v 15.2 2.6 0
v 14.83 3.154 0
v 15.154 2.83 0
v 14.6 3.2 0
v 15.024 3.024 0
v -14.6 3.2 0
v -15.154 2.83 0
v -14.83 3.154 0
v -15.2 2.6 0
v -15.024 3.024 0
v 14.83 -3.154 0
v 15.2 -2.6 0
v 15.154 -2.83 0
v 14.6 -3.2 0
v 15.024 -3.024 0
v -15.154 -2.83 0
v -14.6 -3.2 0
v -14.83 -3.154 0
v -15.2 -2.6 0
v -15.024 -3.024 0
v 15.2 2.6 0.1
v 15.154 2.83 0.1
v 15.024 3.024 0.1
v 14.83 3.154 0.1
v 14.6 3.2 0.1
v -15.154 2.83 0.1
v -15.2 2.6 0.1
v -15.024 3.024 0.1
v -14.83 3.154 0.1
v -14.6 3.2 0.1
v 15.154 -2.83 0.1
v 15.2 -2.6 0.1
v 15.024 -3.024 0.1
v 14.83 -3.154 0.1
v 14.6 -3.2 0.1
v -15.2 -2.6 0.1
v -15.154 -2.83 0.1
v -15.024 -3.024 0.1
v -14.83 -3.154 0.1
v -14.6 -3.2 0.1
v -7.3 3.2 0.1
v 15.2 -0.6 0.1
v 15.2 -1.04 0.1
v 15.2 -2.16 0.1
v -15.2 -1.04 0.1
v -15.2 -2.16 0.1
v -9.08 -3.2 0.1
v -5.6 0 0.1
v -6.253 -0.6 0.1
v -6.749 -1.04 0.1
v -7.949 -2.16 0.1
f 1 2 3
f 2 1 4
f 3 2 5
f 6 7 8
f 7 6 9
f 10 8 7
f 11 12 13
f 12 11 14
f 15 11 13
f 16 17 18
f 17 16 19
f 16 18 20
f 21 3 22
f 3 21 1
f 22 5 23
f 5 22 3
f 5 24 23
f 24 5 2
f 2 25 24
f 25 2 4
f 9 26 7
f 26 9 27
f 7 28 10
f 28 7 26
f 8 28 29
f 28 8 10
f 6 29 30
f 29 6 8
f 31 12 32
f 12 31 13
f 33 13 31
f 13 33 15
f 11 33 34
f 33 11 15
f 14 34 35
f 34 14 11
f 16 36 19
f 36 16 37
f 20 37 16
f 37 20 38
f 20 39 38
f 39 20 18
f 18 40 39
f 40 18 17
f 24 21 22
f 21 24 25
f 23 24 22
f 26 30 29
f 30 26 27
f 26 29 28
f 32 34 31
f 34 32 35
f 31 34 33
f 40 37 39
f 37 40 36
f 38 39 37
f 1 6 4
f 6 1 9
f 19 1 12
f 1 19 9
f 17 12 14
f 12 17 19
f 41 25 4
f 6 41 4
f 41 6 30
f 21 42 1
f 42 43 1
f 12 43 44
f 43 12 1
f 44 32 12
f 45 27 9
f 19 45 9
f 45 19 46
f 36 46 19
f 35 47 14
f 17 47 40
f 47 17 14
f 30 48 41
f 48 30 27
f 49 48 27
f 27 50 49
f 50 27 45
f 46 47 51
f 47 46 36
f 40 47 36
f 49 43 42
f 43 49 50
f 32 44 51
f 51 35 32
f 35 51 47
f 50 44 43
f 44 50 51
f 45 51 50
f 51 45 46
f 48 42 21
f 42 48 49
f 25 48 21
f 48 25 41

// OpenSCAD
// file: ../p/1-4cyli.scad
use <../lib.scad>
function ldraw_lib__1_4cyli() = [
// 0 Cylinder 0.25
// 0 Name: 1-4cyli.dat
// 0 Author: James Jessiman
// 0 !LDRAW_ORG Primitive UPDATE 2012-01
// 0 !LICENSE Licensed under CC BY 4.0 : see CAreadme.txt
// 
// 0 BFC CERTIFY CCW
  [0,"BFC","CERTIFY"],
  [0,"BFC","CCW"],
// 
// 0 !HISTORY 2002-03-23 [sbliss] Added BFC statement.
// 0 !HISTORY 2002-04-25 [PTadmin] Official Update 2002-02
// 0 !HISTORY 2007-06-22 [PTadmin] Header formatted for Contributor Agreement
// 0 !HISTORY 2008-07-01 [PTadmin] Official Update 2008-01
// 0 !HISTORY 2012-02-16 [Philo] Changed to CCW
// 0 !HISTORY 2012-03-30 [PTadmin] Official Update 2012-01
// 
// 
// 4 16 1 1 0 0.9239 1 0.3827 0.9239 0 0.3827 1 0 0
  [4,16,1,1,0,0.9239,1,0.3827,0.9239,0,0.3827,1,0,0],
// 5 24 1 0 0 1 1 0 0.9239 0 0.3827 1 0 -1
  [5,24,1,0,0,1,1,0,0.9239,0,0.3827,1,0,-1],
// 4 16 0.9239 1 0.3827 0.7071 1 0.7071 0.7071 0 0.7071 0.9239 0 0.3827
  [4,16,0.9239,1,0.3827,0.7071,1,0.7071,0.7071,0,0.7071,0.9239,0,0.3827],
// 5 24 0.9239 0 0.3827 0.9239 1 0.3827 0.7071 0 0.7071 1 0 0
  [5,24,0.9239,0,0.3827,0.9239,1,0.3827,0.7071,0,0.7071,1,0,0],
// 4 16 0.7071 1 0.7071 0.3827 1 0.9239 0.3827 0 0.9239 0.7071 0 0.7071
  [4,16,0.7071,1,0.7071,0.3827,1,0.9239,0.3827,0,0.9239,0.7071,0,0.7071],
// 5 24 0.7071 0 0.7071 0.7071 1 0.7071 0.3827 0 0.9239 0.9239 0 0.3827
  [5,24,0.7071,0,0.7071,0.7071,1,0.7071,0.3827,0,0.9239,0.9239,0,0.3827],
// 4 16 0.3827 1 0.9239 0 1 1 0 0 1 0.3827 0 0.9239
  [4,16,0.3827,1,0.9239,0,1,1,0,0,1,0.3827,0,0.9239],
// 5 24 0.3827 0 0.9239 0.3827 1 0.9239 0 0 1 0.7071 0 0.7071
  [5,24,0.3827,0,0.9239,0.3827,1,0.9239,0,0,1,0.7071,0,0.7071],
// 5 24 0 0 1 0 1 1 0.3827 0 0.9239 -1 0 1
  [5,24,0,0,1,0,1,1,0.3827,0,0.9239,-1,0,1],
];
module ldraw_lib__1_4cyli(step=0, col=false, unit=2/5, alt=false, line=0.2, solid=!$preview)
    makepoly(ldraw_lib__1_4cyli(), step=step, col=col, unit=unit, alt=alt, line=line, solid=solid);
ldraw_lib__1_4cyli(line=0.2);
// file: ../p/1-4chrd.scad
use <../lib.scad>
function ldraw_lib__1_4chrd() = [
// 0 Chord 0.25
// 0 Name: 1-4chrd.dat
// 0 Author: Tony Hafner [hafhead]
// 0 !LDRAW_ORG Primitive UPDATE 2012-02
// 0 !LICENSE Licensed under CC BY 2.0 and CC BY 4.0 : see CAreadme.txt
// 
// 0 BFC CERTIFY CCW
  [0,"BFC","CERTIFY"],
  [0,"BFC","CCW"],
// 
// 0 !HISTORY 2004-04-22 [PTadmin] Official Update 2004-02
// 0 !HISTORY 2007-10-09 [PTadmin] Header formatted for Contributor Agreement
// 0 !HISTORY 2008-07-01 [PTadmin] Official Update 2008-01
// 0 !HISTORY 2012-08-02 [MMR1988] Re-creation with PrimGen2 and Rectifier
// 0 !HISTORY 2012-08-09 [PTadmin] Official Update 2012-02
// 
// 
// 4 16 0.9239 0 0.3827 0.3827 0 0.9239 0 0 1 1 0 0
  [4,16,0.9239,0,0.3827,0.3827,0,0.9239,0,0,1,1,0,0],
// 3 16 0.7071 0 0.7071 0.3827 0 0.9239 0.9239 0 0.3827
  [3,16,0.7071,0,0.7071,0.3827,0,0.9239,0.9239,0,0.3827],
];
module ldraw_lib__1_4chrd(step=0, col=false, unit=2/5, alt=false, line=0.2, solid=!$preview)
    makepoly(ldraw_lib__1_4chrd(), step=step, col=col, unit=unit, alt=alt, line=line, solid=solid);
ldraw_lib__1_4chrd(line=0.2);
// file: 6142275f.scad
use <../lib.scad>
use <../p/1-4chrd.scad>
use <../p/1-4cyli.scad>
function ldraw_lib__6142275f() = [
// 0 Sticker  0.8 x  3.8 with Red Line on Black, Grey and White Background Right
// 0 Name: 6142275f.dat
// 0 Author: Massimo Maso [Sirio]
// 0 !LDRAW_ORG Part UPDATE 2022-06
// 0 !LICENSE Licensed under CC BY 4.0 : see CAreadme.txt
// 
// 0 BFC CERTIFY CCW
  [0,"BFC","CERTIFY"],
  [0,"BFC","CCW"],
// 
// 0 !KEYWORDS Audi, e-tron, quattro, R18, Set 75872, Speed Champions
// 
// 0 !HISTORY 2022-12-20 [PTadmin] Official Update 2022-06
// 
// 
// 0 // Primitives
// 1 16 -36.5 0 6.5 -1.5 0 0 0 -1 0 0 0 1.5 1-4chrd.dat
  [1,16,-36.5,0,6.5,-1.5,0,0,0,-1,0,0,0,1.5, ldraw_lib__1_4chrd()],
// 1 16 36.5 0 6.5 1.5 0 0 0 -1 0 0 0 1.5 1-4chrd.dat
  [1,16,36.5,0,6.5,1.5,0,0,0,-1,0,0,0,1.5, ldraw_lib__1_4chrd()],
// 1 16 -36.5 0 -6.5 -1.5 0 0 0 -1 0 0 0 -1.5 1-4chrd.dat
  [1,16,-36.5,0,-6.5,-1.5,0,0,0,-1,0,0,0,-1.5, ldraw_lib__1_4chrd()],
// 1 16 36.5 0 -6.5 1.5 0 0 0 -1 0 0 0 -1.5 1-4chrd.dat
  [1,16,36.5,0,-6.5,1.5,0,0,0,-1,0,0,0,-1.5, ldraw_lib__1_4chrd()],
// 1 16 -36.5 0 6.5 -1.5 0 0 0 -.25 0 0 0 1.5 1-4cyli.dat
  [1,16,-36.5,0,6.5,-1.5,0,0,0,-.25,0,0,0,1.5, ldraw_lib__1_4cyli()],
// 1 16 36.5 0 6.5 1.5 0 0 0 -.25 0 0 0 1.5 1-4cyli.dat
  [1,16,36.5,0,6.5,1.5,0,0,0,-.25,0,0,0,1.5, ldraw_lib__1_4cyli()],
// 1 16 -36.5 0 -6.5 -1.5 0 0 0 -.25 0 0 0 -1.5 1-4cyli.dat
  [1,16,-36.5,0,-6.5,-1.5,0,0,0,-.25,0,0,0,-1.5, ldraw_lib__1_4cyli()],
// 1 16 36.5 0 -6.5 1.5 0 0 0 -.25 0 0 0 -1.5 1-4cyli.dat
  [1,16,36.5,0,-6.5,1.5,0,0,0,-.25,0,0,0,-1.5, ldraw_lib__1_4cyli()],
// 1 15 -36.5 -.25 6.5 -1.5 0 0 0 1 0 0 0 1.5 1-4chrd.dat
  [1,15,-36.5,-.25,6.5,-1.5,0,0,0,1,0,0,0,1.5, ldraw_lib__1_4chrd()],
// 1 0 36.5 -.25 6.5 1.5 0 0 0 1 0 0 0 1.5 1-4chrd.dat
  [1,0,36.5,-.25,6.5,1.5,0,0,0,1,0,0,0,1.5, ldraw_lib__1_4chrd()],
// 1 71 -36.5 -.25 -6.5 -1.5 0 0 0 1 0 0 0 -1.5 1-4chrd.dat
  [1,71,-36.5,-.25,-6.5,-1.5,0,0,0,1,0,0,0,-1.5, ldraw_lib__1_4chrd()],
// 1 0 36.5 -.25 -6.5 1.5 0 0 0 1 0 0 0 -1.5 1-4chrd.dat
  [1,0,36.5,-.25,-6.5,1.5,0,0,0,1,0,0,0,-1.5, ldraw_lib__1_4chrd()],
// 0 // Bottom faces
// 4 16 36.5 0 8 38 0 6.5 -38 0 6.5 -36.5 0 8
  [4,16,36.5,0,8,38,0,6.5,-38,0,6.5,-36.5,0,8],
// 4 16 38 0 6.5 38 0 -6.5 -38 0 -6.5 -38 0 6.5
  [4,16,38,0,6.5,38,0,-6.5,-38,0,-6.5,-38,0,6.5],
// 4 16 36.5 0 -8 -36.5 0 -8 -38 0 -6.5 38 0 -6.5
  [4,16,36.5,0,-8,-36.5,0,-8,-38,0,-6.5,38,0,-6.5],
// 0 // Lateral faces
// 3 16 -36.5 0 8 -36.5 -.25 8 18.25 -.25 8
  [3,16,-36.5,0,8,-36.5,-.25,8,18.25,-.25,8],
// 4 16 -36.5 0 8 18.25 -.25 8 36.5 -.25 8 36.5 0 8
  [4,16,-36.5,0,8,18.25,-.25,8,36.5,-.25,8,36.5,0,8],
// 3 16 -38 0 6.5 -38 -.25 -1.5 -38 -.25 6.5
  [3,16,-38,0,6.5,-38,-.25,-1.5,-38,-.25,6.5],
// 3 16 -38 0 6.5 -38 -.25 -2.6 -38 -.25 -1.5
  [3,16,-38,0,6.5,-38,-.25,-2.6,-38,-.25,-1.5],
// 4 16 -38 0 6.5 -38 0 -6.5 -38 -.25 -5.4 -38 -.25 -2.6
  [4,16,-38,0,6.5,-38,0,-6.5,-38,-.25,-5.4,-38,-.25,-2.6],
// 3 16 -38 0 -6.5 -38 -.25 -6.5 -38 -.25 -5.4
  [3,16,-38,0,-6.5,-38,-.25,-6.5,-38,-.25,-5.4],
// 3 16 38 0 6.5 38 -.25 6.5 38 -.25 -2.6
  [3,16,38,0,6.5,38,-.25,6.5,38,-.25,-2.6],
// 4 16 38 0 6.5 38 -.25 -2.6 38 -.25 -5.4 38 0 -6.5
  [4,16,38,0,6.5,38,-.25,-2.6,38,-.25,-5.4,38,0,-6.5],
// 3 16 38 0 -6.5 38 -.25 -5.4 38 -.25 -6.5
  [3,16,38,0,-6.5,38,-.25,-5.4,38,-.25,-6.5],
// 3 16 -36.5 0 -8 22.7 -.25 -8 -36.5 -.25 -8
  [3,16,-36.5,0,-8,22.7,-.25,-8,-36.5,-.25,-8],
// 4 16 -36.5 0 -8 36.5 0 -8 36.5 -.25 -8 22.7 -.25 -8
  [4,16,-36.5,0,-8,36.5,0,-8,36.5,-.25,-8,22.7,-.25,-8],
// 0 // Top faces
// 0 // Black faces
// 4 0 38 -.25 6.5 36.5 -.25 8 18.25 -.25 8 14 -.25 0
  [4,0,38,-.25,6.5,36.5,-.25,8,18.25,-.25,8,14,-.25,0],
// 3 0 38 -.25 6.5 14 -.25 0 15.6313 -.25 -1.5
  [3,0,38,-.25,6.5,14,-.25,0,15.6313,-.25,-1.5],
// 4 0 38 -.25 6.5 15.6313 -.25 -1.5 16.8725 -.25 -2.6 38 -.25 -2.6
  [4,0,38,-.25,6.5,15.6313,-.25,-1.5,16.8725,-.25,-2.6,38,-.25,-2.6],
// 4 0 38 -.25 -6.5 38 -.25 -5.4 19.8725 -.25 -5.4 22.7 -.25 -8
  [4,0,38,-.25,-6.5,38,-.25,-5.4,19.8725,-.25,-5.4,22.7,-.25,-8],
// 3 0 38 -.25 -6.5 22.7 -.25 -8 36.5 -.25 -8
  [3,0,38,-.25,-6.5,22.7,-.25,-8,36.5,-.25,-8],
// 0 // Grey faces
// 4 71 16.8725 -.25 -2.6 15.6313 -.25 -1.5 -38 -.25 -1.5 -38 -.25 -2.6
  [4,71,16.8725,-.25,-2.6,15.6313,-.25,-1.5,-38,-.25,-1.5,-38,-.25,-2.6],
// 3 71 19.8725 -.25 -5.4 -38 -.25 -5.4 -38 -.25 -6.5
  [3,71,19.8725,-.25,-5.4,-38,-.25,-5.4,-38,-.25,-6.5],
// 4 71 19.8725 -.25 -5.4 -38 -.25 -6.5 -36.5 -.25 -8 22.7 -.25 -8
  [4,71,19.8725,-.25,-5.4,-38,-.25,-6.5,-36.5,-.25,-8,22.7,-.25,-8],
// 0 // Red faces
// 4 4 -38 -.25 -2.6 -38 -.25 -5.4 19.8725 -.25 -5.4 16.8725 -.25 -2.6
  [4,4,-38,-.25,-2.6,-38,-.25,-5.4,19.8725,-.25,-5.4,16.8725,-.25,-2.6],
// 4 4 38 -.25 -2.6 16.8725 -.25 -2.6 19.8725 -.25 -5.4 38 -.25 -5.4
  [4,4,38,-.25,-2.6,16.8725,-.25,-2.6,19.8725,-.25,-5.4,38,-.25,-5.4],
// 0 // White faces
// 4 15 -38 -.25 6.5 -38 -.25 -1.5 15.6313 -.25 -1.5 14 -.25 0
  [4,15,-38,-.25,6.5,-38,-.25,-1.5,15.6313,-.25,-1.5,14,-.25,0],
// 4 15 -38 -.25 6.5 14 -.25 0 18.25 -.25 8 -36.5 -.25 8
  [4,15,-38,-.25,6.5,14,-.25,0,18.25,-.25,8,-36.5,-.25,8],
];
module ldraw_lib__6142275f(step=0, col=false, unit=2/5, alt=false, line=0.2, solid=!$preview)
    makepoly(ldraw_lib__6142275f(), step=step, col=col, unit=unit, alt=alt, line=line, solid=solid);
ldraw_lib__6142275f(line=0.2);
// main file
use <../lib.scad>
use <6142275f.scad>
function ldraw_lib__6142275y() = [
// 0 Sticker  0.8 x  3.8 with Red Line on Black, Grey and White Background Left
// 0 Name: 6142275y.dat
// 0 Author: Massimo Maso [Sirio]
// 0 !LDRAW_ORG Part UPDATE 2022-06
// 0 !LICENSE Licensed under CC BY 4.0 : see CAreadme.txt
// 
// 0 BFC CERTIFY CCW
  [0,"BFC","CERTIFY"],
  [0,"BFC","CCW"],
// 
// 0 !KEYWORDS Audi, e-tron, quattro, R18, Set 75872, Speed Champions
// 
// 0 !HISTORY 2022-12-20 [PTadmin] Official Update 2022-06
// 
// 
// 1 16 0 0 0 -1 0 0 0 1 0 0 0 1 6142275f.dat
  [1,16,0,0,0,-1,0,0,0,1,0,0,0,1, ldraw_lib__6142275f()],
];
module ldraw_lib__6142275y(step=0, col=false, unit=2/5, alt=false, line=0.2, solid=!$preview)
    makepoly(ldraw_lib__6142275y(), step=step, col=col, unit=unit, alt=alt, line=line, solid=solid);
ldraw_lib__6142275y(line=0.2);
